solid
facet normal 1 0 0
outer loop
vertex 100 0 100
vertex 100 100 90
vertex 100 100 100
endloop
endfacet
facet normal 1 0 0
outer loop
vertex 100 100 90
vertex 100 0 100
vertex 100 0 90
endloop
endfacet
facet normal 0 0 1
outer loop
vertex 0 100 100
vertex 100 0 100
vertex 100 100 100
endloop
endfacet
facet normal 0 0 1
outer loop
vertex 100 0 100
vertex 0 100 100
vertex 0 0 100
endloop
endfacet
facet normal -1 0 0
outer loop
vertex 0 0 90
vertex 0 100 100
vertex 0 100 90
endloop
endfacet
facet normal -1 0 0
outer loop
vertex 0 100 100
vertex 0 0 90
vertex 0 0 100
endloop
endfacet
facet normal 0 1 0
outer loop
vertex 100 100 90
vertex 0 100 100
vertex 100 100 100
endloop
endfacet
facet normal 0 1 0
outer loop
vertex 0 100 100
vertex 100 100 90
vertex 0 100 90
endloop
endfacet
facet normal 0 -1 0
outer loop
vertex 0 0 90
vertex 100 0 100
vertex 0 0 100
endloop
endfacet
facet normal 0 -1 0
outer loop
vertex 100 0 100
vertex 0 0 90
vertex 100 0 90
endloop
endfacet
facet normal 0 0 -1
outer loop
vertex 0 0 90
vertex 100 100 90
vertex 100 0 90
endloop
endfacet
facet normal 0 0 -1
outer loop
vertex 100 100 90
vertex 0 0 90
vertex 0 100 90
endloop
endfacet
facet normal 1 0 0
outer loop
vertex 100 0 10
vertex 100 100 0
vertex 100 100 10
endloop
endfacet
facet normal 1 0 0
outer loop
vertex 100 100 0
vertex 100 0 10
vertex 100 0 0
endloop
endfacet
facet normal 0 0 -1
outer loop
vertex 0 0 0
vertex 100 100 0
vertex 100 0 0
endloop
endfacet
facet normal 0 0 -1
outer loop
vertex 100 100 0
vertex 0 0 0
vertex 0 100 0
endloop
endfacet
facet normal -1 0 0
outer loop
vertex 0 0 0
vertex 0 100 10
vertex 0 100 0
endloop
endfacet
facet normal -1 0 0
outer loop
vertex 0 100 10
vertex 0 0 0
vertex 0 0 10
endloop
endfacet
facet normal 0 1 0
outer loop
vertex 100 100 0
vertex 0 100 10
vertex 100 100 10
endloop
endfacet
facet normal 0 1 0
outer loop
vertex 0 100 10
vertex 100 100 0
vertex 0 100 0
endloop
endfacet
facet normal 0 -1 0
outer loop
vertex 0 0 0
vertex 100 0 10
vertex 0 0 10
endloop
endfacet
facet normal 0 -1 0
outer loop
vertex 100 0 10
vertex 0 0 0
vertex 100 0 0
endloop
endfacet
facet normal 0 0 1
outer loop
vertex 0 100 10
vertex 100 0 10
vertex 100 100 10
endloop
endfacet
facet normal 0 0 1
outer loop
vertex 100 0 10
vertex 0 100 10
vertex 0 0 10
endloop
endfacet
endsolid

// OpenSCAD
module top_part(full_size, height, dx = 0.01){
    size_to_differ = [full_size.x + dx * 2, full_size.y + dx*2, full_size.z - height + dx];
    difference() {
        children();
        translate([-dx, -dx, -dx]) 
        cube(size_to_differ);
    }
}

module bottom_part(full_size, height, dx = 0.01){
    size_to_differ = [full_size.x + dx * 2, full_size.y + dx*2, full_size.z - height + dx];
    difference() {
        children();
        translate([-dx, -dx, height]) 
        cube(size_to_differ);
    }
}

top_part(full_size = [100, 100, 100], height = 10)
    cube([100, 100, 100]);

bottom_part(full_size = [100, 100, 100], height = 10)
    cube([100, 100, 100]);
